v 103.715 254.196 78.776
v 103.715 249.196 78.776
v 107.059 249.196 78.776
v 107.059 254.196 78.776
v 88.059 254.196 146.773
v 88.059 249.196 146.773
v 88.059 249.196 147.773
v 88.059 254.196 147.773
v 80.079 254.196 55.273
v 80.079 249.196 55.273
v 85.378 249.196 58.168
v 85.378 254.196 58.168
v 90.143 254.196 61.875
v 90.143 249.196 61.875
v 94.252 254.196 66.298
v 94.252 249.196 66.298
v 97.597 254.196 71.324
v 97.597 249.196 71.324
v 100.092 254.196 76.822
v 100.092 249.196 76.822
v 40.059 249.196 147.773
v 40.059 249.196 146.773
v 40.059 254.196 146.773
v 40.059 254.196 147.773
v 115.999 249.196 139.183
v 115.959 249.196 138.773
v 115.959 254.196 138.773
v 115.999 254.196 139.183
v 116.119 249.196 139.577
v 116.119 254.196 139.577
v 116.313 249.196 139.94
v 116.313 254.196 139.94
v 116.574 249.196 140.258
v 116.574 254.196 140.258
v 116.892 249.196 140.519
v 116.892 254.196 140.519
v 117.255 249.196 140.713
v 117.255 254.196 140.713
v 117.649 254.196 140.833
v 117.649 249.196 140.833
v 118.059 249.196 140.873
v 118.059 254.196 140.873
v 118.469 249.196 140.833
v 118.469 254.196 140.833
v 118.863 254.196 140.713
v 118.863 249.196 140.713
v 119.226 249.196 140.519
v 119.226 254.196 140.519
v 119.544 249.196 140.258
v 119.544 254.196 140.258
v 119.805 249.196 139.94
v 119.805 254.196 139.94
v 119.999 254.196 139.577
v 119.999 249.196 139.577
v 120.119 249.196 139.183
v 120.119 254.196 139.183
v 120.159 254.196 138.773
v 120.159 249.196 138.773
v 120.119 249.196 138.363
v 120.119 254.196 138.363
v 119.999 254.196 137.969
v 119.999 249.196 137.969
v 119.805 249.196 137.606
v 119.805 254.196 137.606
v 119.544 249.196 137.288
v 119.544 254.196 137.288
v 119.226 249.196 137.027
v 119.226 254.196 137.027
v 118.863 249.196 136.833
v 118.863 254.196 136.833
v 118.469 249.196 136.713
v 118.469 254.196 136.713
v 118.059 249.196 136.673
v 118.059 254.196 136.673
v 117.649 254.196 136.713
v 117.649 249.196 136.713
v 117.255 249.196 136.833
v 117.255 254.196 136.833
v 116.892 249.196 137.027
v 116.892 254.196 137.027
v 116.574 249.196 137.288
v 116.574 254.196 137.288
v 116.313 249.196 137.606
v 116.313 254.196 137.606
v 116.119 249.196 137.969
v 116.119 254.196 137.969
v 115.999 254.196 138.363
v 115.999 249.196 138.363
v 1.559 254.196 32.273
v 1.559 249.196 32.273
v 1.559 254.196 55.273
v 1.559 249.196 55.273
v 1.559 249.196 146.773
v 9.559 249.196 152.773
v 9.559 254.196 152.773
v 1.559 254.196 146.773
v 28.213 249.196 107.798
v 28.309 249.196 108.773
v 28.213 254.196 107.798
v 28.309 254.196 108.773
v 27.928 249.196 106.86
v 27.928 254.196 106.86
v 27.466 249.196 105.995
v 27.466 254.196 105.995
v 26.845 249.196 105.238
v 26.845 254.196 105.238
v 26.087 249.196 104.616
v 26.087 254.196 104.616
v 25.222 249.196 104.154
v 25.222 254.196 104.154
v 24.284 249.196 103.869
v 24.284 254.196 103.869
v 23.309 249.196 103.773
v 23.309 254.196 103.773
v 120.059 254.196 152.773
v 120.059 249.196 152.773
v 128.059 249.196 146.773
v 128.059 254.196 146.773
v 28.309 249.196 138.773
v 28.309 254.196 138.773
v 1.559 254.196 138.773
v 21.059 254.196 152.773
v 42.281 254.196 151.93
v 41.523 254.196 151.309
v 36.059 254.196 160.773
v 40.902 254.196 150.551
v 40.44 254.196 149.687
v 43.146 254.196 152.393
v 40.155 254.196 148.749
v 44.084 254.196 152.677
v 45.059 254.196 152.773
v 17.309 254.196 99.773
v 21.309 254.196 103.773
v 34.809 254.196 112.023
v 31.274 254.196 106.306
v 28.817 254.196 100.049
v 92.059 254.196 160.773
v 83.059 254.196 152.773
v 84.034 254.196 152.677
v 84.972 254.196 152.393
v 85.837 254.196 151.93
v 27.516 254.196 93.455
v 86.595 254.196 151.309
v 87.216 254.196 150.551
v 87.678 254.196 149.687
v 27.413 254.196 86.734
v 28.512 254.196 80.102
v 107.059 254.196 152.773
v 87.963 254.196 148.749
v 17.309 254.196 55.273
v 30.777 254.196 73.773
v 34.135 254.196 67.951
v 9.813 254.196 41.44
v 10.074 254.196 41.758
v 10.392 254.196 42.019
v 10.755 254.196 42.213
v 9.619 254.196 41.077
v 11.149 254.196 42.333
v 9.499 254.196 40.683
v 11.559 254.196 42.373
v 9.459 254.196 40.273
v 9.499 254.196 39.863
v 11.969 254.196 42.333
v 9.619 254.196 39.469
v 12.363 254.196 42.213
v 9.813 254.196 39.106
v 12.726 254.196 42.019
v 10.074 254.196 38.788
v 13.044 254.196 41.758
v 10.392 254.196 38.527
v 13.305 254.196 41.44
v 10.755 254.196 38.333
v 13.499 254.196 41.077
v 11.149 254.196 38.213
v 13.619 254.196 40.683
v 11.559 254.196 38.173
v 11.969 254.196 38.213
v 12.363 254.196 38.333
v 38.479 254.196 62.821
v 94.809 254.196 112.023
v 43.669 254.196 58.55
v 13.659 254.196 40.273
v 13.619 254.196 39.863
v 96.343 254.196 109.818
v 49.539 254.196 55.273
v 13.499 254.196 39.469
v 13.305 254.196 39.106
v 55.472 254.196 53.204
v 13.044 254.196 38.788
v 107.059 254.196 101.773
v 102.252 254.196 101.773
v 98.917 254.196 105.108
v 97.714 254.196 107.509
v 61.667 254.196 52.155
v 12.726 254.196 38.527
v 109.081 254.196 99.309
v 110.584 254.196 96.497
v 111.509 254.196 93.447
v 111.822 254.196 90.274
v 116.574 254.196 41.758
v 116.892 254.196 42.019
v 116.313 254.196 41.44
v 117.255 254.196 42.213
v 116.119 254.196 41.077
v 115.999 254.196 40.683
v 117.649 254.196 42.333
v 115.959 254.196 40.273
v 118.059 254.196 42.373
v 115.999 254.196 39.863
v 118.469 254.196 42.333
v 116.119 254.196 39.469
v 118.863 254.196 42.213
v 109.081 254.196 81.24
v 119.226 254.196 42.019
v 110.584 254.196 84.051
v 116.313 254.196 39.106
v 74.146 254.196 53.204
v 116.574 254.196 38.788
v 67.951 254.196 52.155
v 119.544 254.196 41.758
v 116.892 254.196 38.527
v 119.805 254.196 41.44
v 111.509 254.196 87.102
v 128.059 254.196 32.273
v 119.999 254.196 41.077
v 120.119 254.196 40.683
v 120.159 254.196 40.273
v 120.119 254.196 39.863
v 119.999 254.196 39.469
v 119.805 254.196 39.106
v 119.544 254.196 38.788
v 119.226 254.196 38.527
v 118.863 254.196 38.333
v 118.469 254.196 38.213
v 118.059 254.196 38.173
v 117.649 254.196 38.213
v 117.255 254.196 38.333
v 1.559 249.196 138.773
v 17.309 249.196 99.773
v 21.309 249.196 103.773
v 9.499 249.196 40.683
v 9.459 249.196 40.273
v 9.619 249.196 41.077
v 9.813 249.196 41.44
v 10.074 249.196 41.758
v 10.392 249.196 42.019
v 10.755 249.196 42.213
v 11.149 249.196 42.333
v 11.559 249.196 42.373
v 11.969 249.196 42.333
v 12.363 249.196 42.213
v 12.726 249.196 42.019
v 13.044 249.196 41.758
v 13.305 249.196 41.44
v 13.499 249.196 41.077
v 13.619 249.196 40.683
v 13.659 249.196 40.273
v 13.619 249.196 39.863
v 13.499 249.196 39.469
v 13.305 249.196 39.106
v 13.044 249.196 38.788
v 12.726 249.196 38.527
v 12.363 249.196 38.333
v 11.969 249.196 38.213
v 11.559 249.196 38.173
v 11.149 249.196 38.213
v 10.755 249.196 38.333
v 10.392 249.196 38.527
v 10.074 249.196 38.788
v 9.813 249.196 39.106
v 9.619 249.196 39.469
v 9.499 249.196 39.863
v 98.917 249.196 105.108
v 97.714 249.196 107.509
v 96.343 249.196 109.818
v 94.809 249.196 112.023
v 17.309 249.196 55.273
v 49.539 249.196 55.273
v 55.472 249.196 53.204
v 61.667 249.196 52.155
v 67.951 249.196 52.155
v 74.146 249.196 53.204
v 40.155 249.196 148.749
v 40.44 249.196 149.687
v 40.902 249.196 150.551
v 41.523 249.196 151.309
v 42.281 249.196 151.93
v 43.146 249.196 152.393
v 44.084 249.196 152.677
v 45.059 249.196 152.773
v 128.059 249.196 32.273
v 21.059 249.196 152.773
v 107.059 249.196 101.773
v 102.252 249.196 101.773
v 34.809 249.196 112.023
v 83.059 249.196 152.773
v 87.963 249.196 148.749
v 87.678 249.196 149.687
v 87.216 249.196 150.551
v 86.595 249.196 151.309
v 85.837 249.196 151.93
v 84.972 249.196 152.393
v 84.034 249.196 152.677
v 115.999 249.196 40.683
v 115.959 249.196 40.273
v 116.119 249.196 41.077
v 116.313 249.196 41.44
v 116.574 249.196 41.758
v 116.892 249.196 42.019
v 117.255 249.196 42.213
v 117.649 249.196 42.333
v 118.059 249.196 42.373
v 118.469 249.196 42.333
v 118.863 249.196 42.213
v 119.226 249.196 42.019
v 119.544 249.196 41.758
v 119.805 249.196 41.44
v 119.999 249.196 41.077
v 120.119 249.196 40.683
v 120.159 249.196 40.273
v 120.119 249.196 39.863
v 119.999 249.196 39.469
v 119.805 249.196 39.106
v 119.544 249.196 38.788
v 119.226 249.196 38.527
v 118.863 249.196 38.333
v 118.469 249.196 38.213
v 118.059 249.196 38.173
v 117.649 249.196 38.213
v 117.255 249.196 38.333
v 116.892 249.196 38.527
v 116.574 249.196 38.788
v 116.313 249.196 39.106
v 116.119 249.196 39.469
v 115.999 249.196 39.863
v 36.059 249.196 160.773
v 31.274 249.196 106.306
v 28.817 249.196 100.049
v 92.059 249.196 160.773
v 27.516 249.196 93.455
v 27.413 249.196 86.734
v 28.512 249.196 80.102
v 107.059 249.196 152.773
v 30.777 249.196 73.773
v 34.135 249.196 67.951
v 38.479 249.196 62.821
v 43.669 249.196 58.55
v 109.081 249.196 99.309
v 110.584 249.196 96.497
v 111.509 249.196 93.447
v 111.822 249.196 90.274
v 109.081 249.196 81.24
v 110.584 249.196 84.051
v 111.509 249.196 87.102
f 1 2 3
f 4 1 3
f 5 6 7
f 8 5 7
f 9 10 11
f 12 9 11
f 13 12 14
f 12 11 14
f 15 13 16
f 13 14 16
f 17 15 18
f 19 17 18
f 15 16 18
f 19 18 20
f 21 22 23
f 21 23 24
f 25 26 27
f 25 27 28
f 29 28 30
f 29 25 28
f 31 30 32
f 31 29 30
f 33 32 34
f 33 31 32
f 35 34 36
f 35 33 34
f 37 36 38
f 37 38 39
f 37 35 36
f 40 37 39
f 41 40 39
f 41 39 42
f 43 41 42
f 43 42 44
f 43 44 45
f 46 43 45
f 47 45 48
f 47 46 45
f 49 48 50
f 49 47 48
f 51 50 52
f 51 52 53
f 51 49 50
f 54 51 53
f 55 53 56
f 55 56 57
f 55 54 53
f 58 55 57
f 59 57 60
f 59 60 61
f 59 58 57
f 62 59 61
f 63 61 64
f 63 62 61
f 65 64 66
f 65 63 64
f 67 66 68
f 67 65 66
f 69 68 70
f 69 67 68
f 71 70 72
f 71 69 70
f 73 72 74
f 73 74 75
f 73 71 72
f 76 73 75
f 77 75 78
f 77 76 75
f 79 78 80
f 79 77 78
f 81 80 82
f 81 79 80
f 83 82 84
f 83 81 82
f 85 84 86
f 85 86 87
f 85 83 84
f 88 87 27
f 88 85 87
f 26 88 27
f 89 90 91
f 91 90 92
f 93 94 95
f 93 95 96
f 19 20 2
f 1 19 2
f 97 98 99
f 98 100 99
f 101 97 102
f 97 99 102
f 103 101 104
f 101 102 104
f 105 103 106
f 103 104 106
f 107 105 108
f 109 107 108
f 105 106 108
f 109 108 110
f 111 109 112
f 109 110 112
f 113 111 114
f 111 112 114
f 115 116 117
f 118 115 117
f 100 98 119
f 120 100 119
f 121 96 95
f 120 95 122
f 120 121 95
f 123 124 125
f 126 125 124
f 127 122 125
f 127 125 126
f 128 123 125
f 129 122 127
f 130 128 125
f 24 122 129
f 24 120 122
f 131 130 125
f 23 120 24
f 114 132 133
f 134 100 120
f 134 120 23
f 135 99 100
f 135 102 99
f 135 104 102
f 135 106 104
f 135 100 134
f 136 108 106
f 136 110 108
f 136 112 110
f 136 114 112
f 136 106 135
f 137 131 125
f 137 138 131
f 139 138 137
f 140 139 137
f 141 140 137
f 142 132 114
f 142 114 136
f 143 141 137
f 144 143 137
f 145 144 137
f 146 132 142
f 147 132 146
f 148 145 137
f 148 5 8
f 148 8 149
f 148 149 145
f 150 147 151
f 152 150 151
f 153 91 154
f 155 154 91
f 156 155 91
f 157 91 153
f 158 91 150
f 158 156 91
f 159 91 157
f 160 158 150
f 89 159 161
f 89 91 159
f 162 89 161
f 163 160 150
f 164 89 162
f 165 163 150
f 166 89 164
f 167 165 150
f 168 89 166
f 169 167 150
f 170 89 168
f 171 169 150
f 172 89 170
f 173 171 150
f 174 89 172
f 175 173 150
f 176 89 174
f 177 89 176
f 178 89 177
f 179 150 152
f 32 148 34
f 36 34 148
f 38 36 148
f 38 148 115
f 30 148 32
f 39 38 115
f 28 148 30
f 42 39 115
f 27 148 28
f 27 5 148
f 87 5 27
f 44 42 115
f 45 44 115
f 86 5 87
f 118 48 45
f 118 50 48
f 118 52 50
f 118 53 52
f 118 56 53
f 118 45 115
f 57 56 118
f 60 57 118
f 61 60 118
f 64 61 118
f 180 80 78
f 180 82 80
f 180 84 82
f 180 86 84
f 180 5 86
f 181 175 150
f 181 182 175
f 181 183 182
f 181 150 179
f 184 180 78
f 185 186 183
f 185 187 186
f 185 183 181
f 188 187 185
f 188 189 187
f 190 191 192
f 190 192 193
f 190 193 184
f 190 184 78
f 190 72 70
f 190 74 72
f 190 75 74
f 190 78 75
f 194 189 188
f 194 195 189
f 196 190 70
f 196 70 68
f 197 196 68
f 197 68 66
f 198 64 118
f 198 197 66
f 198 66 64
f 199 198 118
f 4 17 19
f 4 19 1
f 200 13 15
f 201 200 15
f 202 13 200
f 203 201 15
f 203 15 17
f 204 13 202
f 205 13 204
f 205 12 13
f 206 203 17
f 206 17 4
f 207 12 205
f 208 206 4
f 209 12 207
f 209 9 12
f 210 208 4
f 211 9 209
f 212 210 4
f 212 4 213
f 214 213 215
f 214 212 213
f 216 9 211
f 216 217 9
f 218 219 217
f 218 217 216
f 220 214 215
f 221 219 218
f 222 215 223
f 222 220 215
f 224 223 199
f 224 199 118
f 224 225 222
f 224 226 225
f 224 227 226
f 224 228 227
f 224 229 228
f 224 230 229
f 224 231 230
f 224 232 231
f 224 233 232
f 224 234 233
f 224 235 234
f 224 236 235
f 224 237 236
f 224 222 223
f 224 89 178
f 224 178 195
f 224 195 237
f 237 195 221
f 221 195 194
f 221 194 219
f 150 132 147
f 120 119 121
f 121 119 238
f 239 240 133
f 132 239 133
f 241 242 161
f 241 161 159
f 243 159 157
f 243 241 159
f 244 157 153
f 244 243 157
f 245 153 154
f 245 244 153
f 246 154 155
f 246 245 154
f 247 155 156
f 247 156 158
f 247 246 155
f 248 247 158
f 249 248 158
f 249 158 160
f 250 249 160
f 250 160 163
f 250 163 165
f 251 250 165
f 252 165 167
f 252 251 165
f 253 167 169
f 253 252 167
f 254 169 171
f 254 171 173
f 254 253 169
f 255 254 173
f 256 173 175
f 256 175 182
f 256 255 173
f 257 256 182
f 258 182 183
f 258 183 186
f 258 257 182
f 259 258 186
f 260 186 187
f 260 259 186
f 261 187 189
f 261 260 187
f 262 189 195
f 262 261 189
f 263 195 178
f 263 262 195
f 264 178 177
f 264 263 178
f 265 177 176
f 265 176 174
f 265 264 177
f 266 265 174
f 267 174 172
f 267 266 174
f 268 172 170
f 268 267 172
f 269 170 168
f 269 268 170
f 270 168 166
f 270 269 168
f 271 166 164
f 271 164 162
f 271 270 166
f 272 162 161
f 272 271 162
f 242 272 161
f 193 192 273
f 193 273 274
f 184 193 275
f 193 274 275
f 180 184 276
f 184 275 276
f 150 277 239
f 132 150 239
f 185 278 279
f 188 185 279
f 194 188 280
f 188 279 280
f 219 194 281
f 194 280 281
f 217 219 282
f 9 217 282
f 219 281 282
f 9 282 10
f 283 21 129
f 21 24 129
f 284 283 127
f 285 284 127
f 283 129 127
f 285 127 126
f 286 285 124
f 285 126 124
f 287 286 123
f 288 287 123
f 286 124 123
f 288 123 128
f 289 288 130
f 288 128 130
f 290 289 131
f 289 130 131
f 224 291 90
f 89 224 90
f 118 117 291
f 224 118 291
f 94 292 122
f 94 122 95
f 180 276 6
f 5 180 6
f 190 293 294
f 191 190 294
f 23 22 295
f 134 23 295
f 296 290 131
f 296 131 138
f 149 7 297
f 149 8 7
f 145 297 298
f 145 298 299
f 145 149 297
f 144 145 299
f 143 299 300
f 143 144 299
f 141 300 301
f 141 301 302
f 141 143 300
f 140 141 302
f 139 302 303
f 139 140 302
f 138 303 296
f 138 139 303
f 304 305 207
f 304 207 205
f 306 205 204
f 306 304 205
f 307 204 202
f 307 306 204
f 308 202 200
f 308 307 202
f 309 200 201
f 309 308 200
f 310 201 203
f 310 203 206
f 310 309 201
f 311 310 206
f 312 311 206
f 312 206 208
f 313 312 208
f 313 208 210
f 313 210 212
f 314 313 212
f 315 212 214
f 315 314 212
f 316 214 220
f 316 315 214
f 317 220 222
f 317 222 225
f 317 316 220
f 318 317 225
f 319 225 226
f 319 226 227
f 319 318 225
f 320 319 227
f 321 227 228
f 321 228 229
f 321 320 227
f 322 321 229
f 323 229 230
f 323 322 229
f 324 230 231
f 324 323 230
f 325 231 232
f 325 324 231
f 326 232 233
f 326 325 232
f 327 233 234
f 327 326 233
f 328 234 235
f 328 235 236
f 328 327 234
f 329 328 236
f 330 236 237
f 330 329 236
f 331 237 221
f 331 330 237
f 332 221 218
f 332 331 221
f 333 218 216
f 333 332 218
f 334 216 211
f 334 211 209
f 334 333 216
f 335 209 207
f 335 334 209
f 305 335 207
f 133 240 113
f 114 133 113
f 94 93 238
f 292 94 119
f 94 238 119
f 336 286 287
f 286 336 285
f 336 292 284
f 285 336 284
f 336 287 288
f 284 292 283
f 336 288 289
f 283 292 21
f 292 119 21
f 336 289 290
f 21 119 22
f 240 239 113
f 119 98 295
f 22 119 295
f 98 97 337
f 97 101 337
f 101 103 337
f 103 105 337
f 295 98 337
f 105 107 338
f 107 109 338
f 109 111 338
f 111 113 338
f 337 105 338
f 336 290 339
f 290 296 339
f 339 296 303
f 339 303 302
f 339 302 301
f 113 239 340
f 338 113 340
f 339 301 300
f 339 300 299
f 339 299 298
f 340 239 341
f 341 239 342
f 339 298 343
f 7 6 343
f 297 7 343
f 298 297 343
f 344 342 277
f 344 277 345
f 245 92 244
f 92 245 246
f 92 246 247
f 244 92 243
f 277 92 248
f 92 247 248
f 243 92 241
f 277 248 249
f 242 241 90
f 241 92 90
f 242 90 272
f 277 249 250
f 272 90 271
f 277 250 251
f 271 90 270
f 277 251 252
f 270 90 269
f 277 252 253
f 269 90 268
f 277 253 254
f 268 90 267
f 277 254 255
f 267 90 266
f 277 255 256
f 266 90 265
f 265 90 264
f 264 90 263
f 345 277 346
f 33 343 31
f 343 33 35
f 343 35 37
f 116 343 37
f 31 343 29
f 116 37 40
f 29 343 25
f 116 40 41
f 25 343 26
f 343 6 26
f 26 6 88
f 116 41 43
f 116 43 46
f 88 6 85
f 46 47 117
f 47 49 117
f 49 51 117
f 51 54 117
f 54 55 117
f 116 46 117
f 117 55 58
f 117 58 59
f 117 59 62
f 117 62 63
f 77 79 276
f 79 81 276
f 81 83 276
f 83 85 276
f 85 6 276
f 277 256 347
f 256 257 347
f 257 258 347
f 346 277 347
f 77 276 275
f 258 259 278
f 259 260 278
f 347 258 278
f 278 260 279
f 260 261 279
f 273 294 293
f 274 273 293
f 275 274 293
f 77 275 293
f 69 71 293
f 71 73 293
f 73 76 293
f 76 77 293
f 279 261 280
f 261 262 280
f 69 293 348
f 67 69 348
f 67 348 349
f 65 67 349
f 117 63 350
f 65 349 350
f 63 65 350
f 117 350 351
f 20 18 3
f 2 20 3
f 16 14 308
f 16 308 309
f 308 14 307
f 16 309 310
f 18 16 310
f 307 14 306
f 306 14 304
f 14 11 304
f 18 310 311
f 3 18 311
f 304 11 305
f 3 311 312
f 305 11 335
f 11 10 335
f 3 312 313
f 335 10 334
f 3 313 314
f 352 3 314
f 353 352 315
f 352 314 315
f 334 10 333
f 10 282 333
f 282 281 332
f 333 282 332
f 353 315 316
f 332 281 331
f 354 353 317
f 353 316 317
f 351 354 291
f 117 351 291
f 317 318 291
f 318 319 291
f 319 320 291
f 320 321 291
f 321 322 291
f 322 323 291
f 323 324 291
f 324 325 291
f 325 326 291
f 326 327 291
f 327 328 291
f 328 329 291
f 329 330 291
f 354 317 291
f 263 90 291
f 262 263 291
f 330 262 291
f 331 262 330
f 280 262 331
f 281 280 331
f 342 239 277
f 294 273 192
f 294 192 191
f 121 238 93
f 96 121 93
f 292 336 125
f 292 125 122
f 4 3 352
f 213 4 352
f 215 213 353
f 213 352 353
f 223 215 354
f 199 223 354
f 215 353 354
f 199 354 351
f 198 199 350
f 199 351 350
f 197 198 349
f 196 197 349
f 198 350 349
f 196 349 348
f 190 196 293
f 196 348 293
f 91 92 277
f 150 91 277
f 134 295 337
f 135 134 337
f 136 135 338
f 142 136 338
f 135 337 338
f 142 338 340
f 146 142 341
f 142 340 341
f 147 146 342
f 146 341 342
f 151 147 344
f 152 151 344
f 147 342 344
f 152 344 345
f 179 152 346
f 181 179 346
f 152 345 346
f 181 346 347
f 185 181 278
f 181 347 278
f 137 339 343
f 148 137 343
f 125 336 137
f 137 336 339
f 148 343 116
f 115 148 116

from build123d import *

# Parameters (mm, degrees)
SKETCH_1_R       = 2.1
EXTRUDE_3_DEPTH  = 5
FILLET_1_R       = 5
CHAMFER_1_SIZE   = 2
CHAMFER_1_SIZE_2 = 2.97860662
CHAMFER_2_SIZE   = 4


with BuildPart() as part:
    # Эскиз1 → Бобышка-Вытянуть3 (new body)
    # profile 1 of 4: a face of its own
    with BuildSketch(Plane(origin=(0, 249.195974268, 0), x_dir=(1, 0, 0), z_dir=(0, 1, 0))):
        with BuildLine():
            ThreePointArc((100.251716198, -101.773129836), (97.92926953, -107.109956368), (94.808980694, -112.023129836))
            Line((94.808980694, -112.023129836), (88.058980694, -146.773129836))
            Line((88.058980694, -146.773129836), (100.251716198, -146.773129836))
            Line((100.251716198, -146.773129836), (100.251716198, -101.773129836))
        make_face()
    # profile 2 of 4: a face of its own
    with BuildSketch(Plane(origin=(0, 249.195974268, 0), x_dir=(1, 0, 0), z_dir=(0, 1, 0))):
        with BuildLine():
            Line((1.558980694, -138.773129836), (1.558980694, -146.773129836))
            Line((1.558980694, -146.773129836), (40.058980694, -146.773129836))
            Line((40.058980694, -146.773129836), (34.808980694, -112.023129836))
            ThreePointArc((34.808980694, -112.023129836), (28.511671278, -80.102125156), (49.53850264, -55.273129836))
            ThreePointArc((49.53850264, -55.273129836), (64.808980694, -52.023129836), (80.079458748, -55.273129836))
            ThreePointArc((80.079458748, -55.273129836), (92.976106795, -64.767059728), (100.735907579, -78.775761573))
            Line((100.735907579, -78.775761573), (100.735907579, -32.273129836))
            Line((100.735907579, -32.273129836), (1.558980694, -32.273129836))
            Line((1.558980694, -32.273129836), (1.558980694, -55.273129836))
            Line((1.558980694, -55.273129836), (17.308980694, -55.273129836))
            Line((17.308980694, -55.273129836), (17.308980694, -89.523129836))
            Line((17.308980694, -89.523129836), (17.308980694, -103.773129836))
            Line((17.308980694, -103.773129836), (28.308980694, -103.773129836))
            Line((28.308980694, -103.773129836), (28.308980694, -138.773129836))
            Line((28.308980694, -138.773129836), (1.558980694, -138.773129836))
        make_face()
        with Locations(Location((11.55898069, -40.273129836, 0), (0, 0, 180))):
            Circle(SKETCH_1_R, mode=Mode.SUBTRACT)
    # profile 3 of 4: a face of its own
    with BuildSketch(Plane(origin=(0, 249.195974268, 0), x_dir=(1, 0, 0), z_dir=(0, 1, 0))):
        Polygon((88.058980694, -160.773129836), (40.058980694, -160.773129836), (36.058980694, -160.773129836), (21.058980694, -152.773129836), (9.558980694, -152.773129836), (1.558980694, -146.773129836), (40.058980694, -146.773129836), (40.058980694, -152.773129836), (88.058980694, -152.773129836), align=None)
    # profile 4 of 4: a face of its own
    with BuildSketch(Plane(origin=(0, 249.195974268, 0), x_dir=(1, 0, 0), z_dir=(0, 1, 0))):
        with BuildLine():
            Line((88.058980694, -146.773129836), (88.058980694, -152.773129836))
            Line((88.058980694, -152.773129836), (88.058980694, -160.773129836))
            Line((88.058980694, -160.773129836), (92.058980694, -160.773129836))
            Line((92.058980694, -160.773129836), (107.058980694, -152.773129836))
            Line((107.058980694, -152.773129836), (120.058980694, -152.773129836))
            Line((120.058980694, -152.773129836), (128.058980694, -146.773129836))
            Line((128.058980694, -146.773129836), (128.058980694, -55.273129836))
            Line((128.058980694, -55.273129836), (128.058980694, -32.273129836))
            Line((128.058980694, -32.273129836), (107.058980694, -32.273129836))
            Line((107.058980694, -32.273129836), (100.735907579, -32.273129836))
            Line((100.735907579, -32.273129836), (100.735907579, -78.775761573))
            Line((100.735907579, -78.775761573), (107.058980694, -78.775761573))
            ThreePointArc((107.058980694, -78.775761573), (111.821891611, -90.274445705), (107.058980694, -101.773129836))
            Line((107.058980694, -101.773129836), (100.251716198, -101.773129836))
            Line((100.251716198, -101.773129836), (100.251716198, -146.773129836))
            Line((100.251716198, -146.773129836), (88.058980694, -146.773129836))
        make_face()
        with Locations(Location((118.058980694, -138.773129836, 0), (0, 0, 180))):
            Circle(SKETCH_1_R, mode=Mode.SUBTRACT)
        with Locations(Location((118.058980694, -40.273129836, 0), (0, 0, 180))):
            Circle(SKETCH_1_R, mode=Mode.SUBTRACT)
    extrude(amount=EXTRUDE_3_DEPTH)

    # Скругление1
    fillet_1_edges = [part.edges().sort_by_distance(p)[0] for p in [
        (28.308980694, 251.695974268, 103.773129836),
        (40.058980694, 251.695974268, 152.773129836),
        (88.058980694, 251.695974268, 152.773129836),
    ]]
    fillet(fillet_1_edges, radius=FILLET_1_R)

    # Фаска1
    # the kernel refuses this chamfer: 3.233771195, 2.97860662, 2 mm, written as the material it takes off along each edge
    with BuildSketch(Plane(origin=(100.251716198, 239.918924652, 101.773129836), x_dir=(-0.3715523502271027, -3.437549783964329e-15, 0.9284120050067838), z_dir=(0, 1, 0))) as chamfer_1_piece_1:
        with BuildLine():
            Line((3.591569227, 0), (-CHAMFER_1_SIZE * 0.371552350227, CHAMFER_1_SIZE * 0.928412005007))
            Line((-CHAMFER_1_SIZE * 0.371552350227, CHAMFER_1_SIZE * 0.928412005007), (0, 0))
            ThreePointArc((0, 0), (1.855343846, 0.04297528), (3.591569227, 0))
        make_face()
    extrude(amount=23.554099231, mode=Mode.SUBTRACT)
    with BuildSketch(Plane(origin=(100.735907579, 241.48601373, 78.775761573), x_dir=(-0.31276738664383585, -2.8936796166985435e-15, -0.9498297541412279), z_dir=(0, 1, 0))) as chamfer_1_piece_2:
        with BuildLine():
            Line((2.057201754, 0), (-CHAMFER_1_SIZE_2 * 0.312767386639, -CHAMFER_1_SIZE_2 * 0.949829754125))
            Line((-CHAMFER_1_SIZE_2 * 0.312767386639, -CHAMFER_1_SIZE_2 * 0.949829754125), (0, 0))
            ThreePointArc((0, 0), (1.071927906, -0.014084555), (2.057201754, 0))
        make_face()
    extrude(amount=20.419921076, mode=Mode.SUBTRACT)

    # Фаска2
    chamfer_2_edges = [part.edges().sort_by_distance(p)[0] for p in [
        (17.308980694, 251.695974268, 103.773129836),
    ]]
    chamfer(chamfer_2_edges, length=CHAMFER_2_SIZE)


solid = part.part
